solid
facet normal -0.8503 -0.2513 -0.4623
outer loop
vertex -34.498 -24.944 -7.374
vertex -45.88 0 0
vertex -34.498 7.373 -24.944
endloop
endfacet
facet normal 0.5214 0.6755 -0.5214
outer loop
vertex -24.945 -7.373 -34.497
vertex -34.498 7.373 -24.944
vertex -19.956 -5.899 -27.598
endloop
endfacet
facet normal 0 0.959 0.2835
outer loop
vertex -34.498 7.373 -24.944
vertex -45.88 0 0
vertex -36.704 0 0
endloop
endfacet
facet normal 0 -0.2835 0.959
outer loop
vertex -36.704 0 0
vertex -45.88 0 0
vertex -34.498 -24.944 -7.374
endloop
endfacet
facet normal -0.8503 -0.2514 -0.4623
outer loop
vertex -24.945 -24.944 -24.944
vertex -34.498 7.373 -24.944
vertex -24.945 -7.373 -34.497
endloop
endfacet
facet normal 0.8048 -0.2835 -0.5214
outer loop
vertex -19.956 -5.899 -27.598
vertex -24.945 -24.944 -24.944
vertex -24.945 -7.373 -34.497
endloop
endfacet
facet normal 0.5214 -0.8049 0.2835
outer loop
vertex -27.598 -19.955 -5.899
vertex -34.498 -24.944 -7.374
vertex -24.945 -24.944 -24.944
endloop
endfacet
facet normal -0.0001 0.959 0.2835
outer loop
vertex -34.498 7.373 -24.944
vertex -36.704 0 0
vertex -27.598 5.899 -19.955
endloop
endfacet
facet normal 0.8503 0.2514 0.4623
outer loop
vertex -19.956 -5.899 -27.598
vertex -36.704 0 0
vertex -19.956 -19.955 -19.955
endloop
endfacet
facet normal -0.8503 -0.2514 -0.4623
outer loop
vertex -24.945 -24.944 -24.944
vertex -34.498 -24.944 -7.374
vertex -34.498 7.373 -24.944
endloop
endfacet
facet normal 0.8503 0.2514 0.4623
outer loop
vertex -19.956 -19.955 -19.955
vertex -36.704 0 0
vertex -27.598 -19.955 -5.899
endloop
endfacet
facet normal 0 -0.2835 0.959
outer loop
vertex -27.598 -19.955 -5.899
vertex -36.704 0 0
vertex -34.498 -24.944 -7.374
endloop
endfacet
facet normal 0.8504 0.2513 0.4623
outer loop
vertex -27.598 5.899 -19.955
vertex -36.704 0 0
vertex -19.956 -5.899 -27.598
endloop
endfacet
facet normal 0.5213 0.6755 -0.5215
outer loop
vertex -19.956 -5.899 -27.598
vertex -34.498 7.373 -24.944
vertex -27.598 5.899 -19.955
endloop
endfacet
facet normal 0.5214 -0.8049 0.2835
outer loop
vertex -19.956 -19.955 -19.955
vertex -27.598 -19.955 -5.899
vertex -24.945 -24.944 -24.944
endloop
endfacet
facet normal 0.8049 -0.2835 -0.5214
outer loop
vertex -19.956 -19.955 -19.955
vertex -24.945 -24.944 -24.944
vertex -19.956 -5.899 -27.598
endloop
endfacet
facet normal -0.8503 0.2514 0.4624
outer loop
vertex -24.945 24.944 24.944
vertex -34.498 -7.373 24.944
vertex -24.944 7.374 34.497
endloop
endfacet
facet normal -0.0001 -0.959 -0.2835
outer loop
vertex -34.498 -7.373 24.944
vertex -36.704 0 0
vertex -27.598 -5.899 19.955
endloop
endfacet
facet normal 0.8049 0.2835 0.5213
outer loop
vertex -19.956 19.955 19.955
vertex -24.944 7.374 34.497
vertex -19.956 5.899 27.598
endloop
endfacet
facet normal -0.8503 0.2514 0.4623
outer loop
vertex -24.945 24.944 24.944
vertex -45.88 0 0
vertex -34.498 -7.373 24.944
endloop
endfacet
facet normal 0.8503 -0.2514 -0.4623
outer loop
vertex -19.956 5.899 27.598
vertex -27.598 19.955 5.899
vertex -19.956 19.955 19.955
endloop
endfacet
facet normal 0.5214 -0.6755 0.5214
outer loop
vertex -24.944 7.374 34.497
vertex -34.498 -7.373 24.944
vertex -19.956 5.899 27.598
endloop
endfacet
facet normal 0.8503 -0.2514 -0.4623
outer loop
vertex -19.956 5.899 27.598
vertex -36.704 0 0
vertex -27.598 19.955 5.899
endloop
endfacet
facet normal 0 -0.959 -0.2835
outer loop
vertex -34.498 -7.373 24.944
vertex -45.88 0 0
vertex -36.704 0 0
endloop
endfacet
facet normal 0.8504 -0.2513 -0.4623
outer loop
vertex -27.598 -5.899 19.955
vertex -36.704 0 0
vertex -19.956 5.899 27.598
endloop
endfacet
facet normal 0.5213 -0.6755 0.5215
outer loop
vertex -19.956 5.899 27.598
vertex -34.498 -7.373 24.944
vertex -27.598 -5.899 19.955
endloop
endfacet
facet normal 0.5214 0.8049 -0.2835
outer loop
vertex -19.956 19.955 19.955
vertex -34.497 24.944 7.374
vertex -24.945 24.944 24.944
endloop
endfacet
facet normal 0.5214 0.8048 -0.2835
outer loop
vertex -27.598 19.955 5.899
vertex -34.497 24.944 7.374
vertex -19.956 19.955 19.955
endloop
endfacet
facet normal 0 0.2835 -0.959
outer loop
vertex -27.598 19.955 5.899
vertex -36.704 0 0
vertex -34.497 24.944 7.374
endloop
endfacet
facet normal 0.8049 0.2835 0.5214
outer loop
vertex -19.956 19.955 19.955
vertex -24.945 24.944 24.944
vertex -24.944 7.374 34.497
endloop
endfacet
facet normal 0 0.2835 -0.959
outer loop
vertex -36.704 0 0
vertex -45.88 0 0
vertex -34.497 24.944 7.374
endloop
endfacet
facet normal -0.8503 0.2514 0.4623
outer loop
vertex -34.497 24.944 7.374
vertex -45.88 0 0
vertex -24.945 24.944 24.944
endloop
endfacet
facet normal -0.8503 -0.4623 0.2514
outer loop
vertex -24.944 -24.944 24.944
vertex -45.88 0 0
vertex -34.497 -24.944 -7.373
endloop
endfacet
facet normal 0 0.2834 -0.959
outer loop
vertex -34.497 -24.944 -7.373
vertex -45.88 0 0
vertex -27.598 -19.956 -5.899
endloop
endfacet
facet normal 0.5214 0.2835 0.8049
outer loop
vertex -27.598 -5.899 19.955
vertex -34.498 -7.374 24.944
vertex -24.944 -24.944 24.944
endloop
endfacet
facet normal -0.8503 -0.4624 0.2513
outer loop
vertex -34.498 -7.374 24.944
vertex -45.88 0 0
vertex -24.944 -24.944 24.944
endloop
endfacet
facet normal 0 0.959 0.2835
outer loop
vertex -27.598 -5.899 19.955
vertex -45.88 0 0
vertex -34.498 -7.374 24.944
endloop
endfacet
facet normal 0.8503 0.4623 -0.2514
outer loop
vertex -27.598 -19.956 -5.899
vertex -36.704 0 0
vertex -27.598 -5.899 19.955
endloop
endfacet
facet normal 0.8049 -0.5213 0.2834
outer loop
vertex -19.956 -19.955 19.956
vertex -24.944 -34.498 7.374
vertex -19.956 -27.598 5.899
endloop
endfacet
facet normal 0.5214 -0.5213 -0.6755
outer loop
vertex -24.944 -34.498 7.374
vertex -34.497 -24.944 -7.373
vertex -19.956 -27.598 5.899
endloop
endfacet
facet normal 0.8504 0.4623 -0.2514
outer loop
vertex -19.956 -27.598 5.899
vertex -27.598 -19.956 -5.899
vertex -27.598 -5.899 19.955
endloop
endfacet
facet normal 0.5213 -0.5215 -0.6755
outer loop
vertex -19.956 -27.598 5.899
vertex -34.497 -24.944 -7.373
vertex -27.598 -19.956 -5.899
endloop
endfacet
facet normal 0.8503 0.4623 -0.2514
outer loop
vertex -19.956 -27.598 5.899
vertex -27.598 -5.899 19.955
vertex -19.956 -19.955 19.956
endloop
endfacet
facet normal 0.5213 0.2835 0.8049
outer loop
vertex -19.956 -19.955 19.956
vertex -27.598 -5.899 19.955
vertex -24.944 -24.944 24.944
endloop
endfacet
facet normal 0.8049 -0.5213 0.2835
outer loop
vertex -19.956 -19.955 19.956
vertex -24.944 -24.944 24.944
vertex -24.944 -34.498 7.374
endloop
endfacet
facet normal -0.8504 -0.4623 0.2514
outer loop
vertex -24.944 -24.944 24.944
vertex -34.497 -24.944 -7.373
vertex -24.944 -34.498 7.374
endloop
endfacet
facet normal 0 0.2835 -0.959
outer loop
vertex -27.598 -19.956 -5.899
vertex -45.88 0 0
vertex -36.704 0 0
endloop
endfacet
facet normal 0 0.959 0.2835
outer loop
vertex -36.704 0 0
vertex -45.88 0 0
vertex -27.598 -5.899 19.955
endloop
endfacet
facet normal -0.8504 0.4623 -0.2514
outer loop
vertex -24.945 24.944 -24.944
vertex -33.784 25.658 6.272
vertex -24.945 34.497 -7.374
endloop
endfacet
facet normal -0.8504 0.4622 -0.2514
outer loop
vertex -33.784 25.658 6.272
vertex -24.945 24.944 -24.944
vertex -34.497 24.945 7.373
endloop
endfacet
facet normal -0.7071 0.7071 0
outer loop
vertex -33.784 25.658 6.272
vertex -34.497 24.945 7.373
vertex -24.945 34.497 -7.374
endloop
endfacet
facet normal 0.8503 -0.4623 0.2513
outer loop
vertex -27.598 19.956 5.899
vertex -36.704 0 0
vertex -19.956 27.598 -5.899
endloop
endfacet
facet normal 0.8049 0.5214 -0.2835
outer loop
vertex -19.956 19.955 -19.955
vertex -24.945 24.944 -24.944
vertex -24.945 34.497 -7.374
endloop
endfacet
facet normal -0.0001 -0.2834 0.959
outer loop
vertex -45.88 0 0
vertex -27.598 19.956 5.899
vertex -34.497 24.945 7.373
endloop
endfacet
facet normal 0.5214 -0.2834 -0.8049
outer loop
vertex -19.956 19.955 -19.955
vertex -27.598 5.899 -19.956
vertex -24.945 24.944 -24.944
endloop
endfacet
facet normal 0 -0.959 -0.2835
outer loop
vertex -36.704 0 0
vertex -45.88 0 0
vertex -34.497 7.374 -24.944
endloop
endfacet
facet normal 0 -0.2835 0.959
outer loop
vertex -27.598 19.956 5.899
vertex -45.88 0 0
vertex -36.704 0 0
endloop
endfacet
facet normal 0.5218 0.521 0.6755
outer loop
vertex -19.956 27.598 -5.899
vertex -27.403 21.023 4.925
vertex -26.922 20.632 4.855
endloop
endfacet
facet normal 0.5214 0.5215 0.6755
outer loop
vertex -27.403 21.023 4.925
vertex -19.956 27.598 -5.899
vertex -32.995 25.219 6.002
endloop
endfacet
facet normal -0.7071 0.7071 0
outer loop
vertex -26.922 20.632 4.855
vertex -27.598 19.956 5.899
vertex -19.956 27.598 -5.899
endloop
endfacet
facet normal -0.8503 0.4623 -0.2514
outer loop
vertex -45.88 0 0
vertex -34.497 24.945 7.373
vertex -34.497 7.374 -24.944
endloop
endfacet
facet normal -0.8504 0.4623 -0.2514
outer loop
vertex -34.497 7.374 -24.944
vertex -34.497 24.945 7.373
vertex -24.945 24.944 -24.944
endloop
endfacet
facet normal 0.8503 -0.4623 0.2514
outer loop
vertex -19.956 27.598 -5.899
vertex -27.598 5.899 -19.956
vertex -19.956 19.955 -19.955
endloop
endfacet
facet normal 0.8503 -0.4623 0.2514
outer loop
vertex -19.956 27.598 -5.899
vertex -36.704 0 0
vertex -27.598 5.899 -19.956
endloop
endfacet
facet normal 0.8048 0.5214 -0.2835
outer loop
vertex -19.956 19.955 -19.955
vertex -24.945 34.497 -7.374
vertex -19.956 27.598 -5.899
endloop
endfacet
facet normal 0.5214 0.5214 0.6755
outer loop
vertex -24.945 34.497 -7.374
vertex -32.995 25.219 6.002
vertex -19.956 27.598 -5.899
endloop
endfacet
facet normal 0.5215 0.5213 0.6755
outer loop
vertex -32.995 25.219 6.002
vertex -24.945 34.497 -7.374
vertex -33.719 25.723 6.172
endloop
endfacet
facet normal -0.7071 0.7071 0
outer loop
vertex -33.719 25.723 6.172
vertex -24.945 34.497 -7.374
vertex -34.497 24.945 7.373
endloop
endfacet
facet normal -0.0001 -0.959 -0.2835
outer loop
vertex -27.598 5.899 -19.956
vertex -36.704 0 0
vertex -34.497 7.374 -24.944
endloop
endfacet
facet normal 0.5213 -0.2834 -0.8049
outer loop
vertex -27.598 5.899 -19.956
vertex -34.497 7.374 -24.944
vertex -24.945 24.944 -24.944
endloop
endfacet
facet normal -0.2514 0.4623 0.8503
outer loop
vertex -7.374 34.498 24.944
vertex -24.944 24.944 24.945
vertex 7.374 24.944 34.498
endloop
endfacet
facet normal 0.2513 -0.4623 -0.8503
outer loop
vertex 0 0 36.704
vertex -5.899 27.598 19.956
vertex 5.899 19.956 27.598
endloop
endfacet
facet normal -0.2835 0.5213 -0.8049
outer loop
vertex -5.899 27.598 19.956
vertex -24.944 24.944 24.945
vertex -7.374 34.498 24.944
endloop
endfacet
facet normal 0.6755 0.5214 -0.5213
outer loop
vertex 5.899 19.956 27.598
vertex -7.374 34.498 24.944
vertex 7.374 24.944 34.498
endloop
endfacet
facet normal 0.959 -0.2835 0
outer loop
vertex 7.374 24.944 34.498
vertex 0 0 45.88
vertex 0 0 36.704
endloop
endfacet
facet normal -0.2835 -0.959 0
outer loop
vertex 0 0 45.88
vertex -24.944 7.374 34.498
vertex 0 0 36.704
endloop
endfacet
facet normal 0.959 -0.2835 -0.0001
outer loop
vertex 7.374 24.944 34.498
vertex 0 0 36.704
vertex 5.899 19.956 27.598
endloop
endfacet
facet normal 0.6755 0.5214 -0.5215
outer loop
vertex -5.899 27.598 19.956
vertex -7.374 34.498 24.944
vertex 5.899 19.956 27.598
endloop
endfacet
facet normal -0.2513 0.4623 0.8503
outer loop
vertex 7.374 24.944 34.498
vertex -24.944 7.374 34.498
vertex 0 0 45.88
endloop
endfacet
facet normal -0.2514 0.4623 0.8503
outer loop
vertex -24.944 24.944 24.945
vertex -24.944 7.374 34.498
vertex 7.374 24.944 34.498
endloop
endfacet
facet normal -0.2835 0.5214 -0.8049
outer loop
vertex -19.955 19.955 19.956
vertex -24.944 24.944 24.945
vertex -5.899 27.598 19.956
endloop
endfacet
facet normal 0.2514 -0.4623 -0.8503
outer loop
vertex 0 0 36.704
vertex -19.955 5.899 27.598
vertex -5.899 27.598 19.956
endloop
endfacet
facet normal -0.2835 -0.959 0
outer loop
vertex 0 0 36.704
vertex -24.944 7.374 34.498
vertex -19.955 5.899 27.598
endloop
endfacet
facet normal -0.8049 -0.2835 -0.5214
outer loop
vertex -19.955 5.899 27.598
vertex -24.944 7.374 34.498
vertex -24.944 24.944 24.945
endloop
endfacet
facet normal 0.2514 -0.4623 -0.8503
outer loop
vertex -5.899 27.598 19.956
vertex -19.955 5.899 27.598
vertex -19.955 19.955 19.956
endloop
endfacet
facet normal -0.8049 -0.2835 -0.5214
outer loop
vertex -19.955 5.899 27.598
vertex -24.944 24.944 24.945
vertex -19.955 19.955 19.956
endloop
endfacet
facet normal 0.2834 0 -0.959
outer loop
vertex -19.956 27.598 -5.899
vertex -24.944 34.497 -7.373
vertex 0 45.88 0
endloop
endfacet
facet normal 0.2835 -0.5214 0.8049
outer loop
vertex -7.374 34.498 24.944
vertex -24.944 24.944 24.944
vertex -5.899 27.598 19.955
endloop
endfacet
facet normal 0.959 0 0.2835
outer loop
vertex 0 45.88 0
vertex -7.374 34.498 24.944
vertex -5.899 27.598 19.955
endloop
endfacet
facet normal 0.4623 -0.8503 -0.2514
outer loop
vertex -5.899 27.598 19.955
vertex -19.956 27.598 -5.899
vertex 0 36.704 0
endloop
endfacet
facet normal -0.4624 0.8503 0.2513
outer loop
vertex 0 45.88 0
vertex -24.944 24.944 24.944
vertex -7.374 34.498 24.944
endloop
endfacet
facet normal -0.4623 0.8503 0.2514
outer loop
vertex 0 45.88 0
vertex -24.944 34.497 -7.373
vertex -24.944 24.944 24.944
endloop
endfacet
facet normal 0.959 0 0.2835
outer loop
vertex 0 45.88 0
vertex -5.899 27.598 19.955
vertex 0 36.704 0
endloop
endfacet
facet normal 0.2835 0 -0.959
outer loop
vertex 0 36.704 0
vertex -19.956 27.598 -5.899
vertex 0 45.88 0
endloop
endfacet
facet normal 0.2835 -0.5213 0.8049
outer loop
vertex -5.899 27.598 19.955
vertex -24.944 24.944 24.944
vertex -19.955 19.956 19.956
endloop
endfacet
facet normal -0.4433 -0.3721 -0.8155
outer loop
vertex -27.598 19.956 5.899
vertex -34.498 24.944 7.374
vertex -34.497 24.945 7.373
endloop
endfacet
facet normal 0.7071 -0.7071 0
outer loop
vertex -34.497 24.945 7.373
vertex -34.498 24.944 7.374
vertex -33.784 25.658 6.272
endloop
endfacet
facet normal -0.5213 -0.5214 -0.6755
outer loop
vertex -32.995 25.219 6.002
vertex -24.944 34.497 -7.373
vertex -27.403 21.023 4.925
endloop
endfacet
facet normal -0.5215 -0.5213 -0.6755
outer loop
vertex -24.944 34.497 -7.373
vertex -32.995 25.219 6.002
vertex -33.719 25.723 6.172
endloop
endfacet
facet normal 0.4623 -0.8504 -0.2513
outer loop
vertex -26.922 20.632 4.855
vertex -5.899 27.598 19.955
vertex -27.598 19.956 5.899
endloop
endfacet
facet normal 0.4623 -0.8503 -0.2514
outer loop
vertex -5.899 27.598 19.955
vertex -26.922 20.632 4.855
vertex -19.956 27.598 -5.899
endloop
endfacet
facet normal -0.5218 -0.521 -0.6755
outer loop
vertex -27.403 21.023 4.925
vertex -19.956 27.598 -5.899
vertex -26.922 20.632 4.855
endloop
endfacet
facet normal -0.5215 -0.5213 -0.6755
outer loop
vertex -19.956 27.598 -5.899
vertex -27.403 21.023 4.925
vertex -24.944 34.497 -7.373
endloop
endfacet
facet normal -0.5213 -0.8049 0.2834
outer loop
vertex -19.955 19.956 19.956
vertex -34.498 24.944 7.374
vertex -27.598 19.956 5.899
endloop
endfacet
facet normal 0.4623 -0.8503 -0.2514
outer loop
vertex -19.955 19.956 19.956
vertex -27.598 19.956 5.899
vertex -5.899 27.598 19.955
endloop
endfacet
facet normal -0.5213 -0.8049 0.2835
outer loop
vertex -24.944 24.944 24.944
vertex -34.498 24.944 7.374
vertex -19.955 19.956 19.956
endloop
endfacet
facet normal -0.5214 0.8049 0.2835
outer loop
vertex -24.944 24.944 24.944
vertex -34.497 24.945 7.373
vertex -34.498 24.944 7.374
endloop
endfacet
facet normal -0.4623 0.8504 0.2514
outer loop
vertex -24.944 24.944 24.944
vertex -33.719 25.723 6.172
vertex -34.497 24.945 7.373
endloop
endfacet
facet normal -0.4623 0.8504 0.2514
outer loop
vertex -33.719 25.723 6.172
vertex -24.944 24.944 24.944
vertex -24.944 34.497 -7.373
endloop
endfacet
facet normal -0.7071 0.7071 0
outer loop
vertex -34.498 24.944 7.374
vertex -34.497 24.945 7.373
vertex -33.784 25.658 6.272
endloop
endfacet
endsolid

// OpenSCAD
// This is the extrusion amount. 
// When t=1, it extrudes to the center of the polyhedron
t=0.2; 

// Toggle these to determine which faces to draw.
f1 = true;
f2 = true;
f3 = false;
f4 = false;
f5 = false;
f6 = false;
f7 = false;
f8 = false;

scale([20,20,20]){
    if(f1){
    // 1, 2, 3
    color("red"){
        multmatrix([
          [-0.344813, -0.397524, -0.85034],
          [-0.397524, 0.882493, -0.251359],
          [0.85034, 0.251359, -0.462321]
        ])

        translate([0,0,1.95068])
        scale([1,1,-1])
        linear_extrude(height = 1.95068*t, scale=[1-t,1-t], $fn=100)

        polygon([
          [0.777062, -0.507655],
          [0.791002, 0.91192],
          [-0.61236, 0.697535],
          [-0.890117, -0.263117],
          [-0.134704, -0.918365]
        ]);

        multmatrix([
          [0.505527, 0.146165, -0.85034],
          [0.146165, 0.956794, 0.251359],
          [0.85034, -0.251359, 0.462321]
        ])

        translate([0,0,1.95068])
        scale([1,1,-1])
        linear_extrude(height = 1.95068*t, scale=[1-t,1-t], $fn=100)

        polygon([
          [0.890117, -0.263117],
          [0.61236, 0.697535],
          [-0.376172, 0.848548],
          [-1.15968, -0.335303],
          [0.134704, -0.918365]
        ]);

        multmatrix([
          [0.422165, -0.314162, -0.85034],
          [-0.314162, 0.829193, -0.462321],
          [0.85034, 0.462321, 0.251359]
        ])

        translate([0,0,1.95068])
        scale([1,1,-1])
        linear_extrude(height = 1.95068*t, scale=[1-t,1-t], $fn=100)

        polygon([
          [0.328858, -0.867981],
          [0.92586, -0.0657416],
          [0.448204, 0.812805],
          [-0.968448, 0.720689],
          [-0.649854, -0.662744]
        ]);
    };


    }

    if(f2){
    // 4, 12, 18
    color("blue"){
        multmatrix([
          [0.0341457, 0.525124, -0.85034],
          [0.525124, 0.714496, 0.462321],
          [0.85034, -0.462321, -0.251359]
        ])

        translate([0,0,1.95068])
        scale([1,1,-1])
        linear_extrude(height = 1.95068*t, scale=[1-t,1-t], $fn=100)

        polygon([
          [-0.92586, -0.0657416],
          [-0.0783303, -1.20464],
          [0.90955, -0.185087],
          [0.549689, 0.747918],
          [-0.448204, 0.812805]
        ]);

        multmatrix([
          [0.965854, 0.0628037, -0.251359],
          [0.0628037, 0.884486, 0.462321],
          [0.251359, -0.462321, 0.85034]
        ])

        translate([0,0,1.95068])
        scale([1,1,-1])
        linear_extrude(height = 1.95068*t, scale=[1-t,1-t], $fn=100)

        polygon([
          [0.867981, 0.328858],
          [0.0657416, 0.92586],
          [-0.812805, 0.448204],
          [-0.747918, -0.549689],
          [0.576617, -1.06056]
        ]);

        multmatrix([
          [0.829193, 0.314162, -0.462321],
          [0.314162, 0.422165, 0.85034],
          [0.462321, -0.85034, 0.251359]
        ])

        translate([0,0,1.95068])
        scale([1,1,-1])
        linear_extrude(height = 1.95068*t, scale=[1-t,1-t], $fn=100)

        polygon([
          [0.720689, 0.968448],
          [-0.662744, 0.649854],
          [-0.867981, -0.328858],
          [-0.0657416, -0.92586],
          [0.812805, -0.448204]
        ]);   
    }


    }

    if(f3){
    // 5, 13, 21
    color("green"){
        multmatrix([
          [0.505527, 0.146165, 0.85034],
          [0.146165, 0.956794, -0.251359],
          [-0.85034, 0.251359, 0.462321]
        ])

        translate([0,0,1.95068])
        scale([1,1,-1])
        linear_extrude(height = 1.95068*t, scale=[1-t,1-t], $fn=100)

        polygon([
          [1.15968, 0.335303],
          [-0.134704, 0.918365],
          [-0.890117, 0.263117],
          [-0.61236, -0.697535],
          [0.376172, -0.848548]
        ]);

        multmatrix([
          [0.882493, 0.397524, 0.251359],
          [0.397524, -0.344813, -0.85034],
          [-0.251359, 0.85034, -0.462321]
        ])

        translate([0,0,1.95068])
        scale([1,1,-1])
        linear_extrude(height = 1.95068*t, scale=[1-t,1-t], $fn=100)

        polygon([
          [-0.91192, 0.791002],
          [-0.697535, -0.61236],
          [0.263117, -0.890117],
          [0.918365, -0.134704],
          [0.507655, 0.777062]
        ]);

        multmatrix([
          [0.829193, 0.314162, 0.462321],
          [0.314162, 0.422165, -0.85034],
          [-0.462321, 0.85034, 0.251359]
        ])

        translate([0,0,1.95068])
        scale([1,1,-1])
        linear_extrude(height = 1.95068*t, scale=[1-t,1-t], $fn=100)

        polygon([
          [0.867981, 0.328858],
          [0.0657416, 0.92586],
          [-0.812805, 0.448204],
          [-0.720689, -0.968448],
          [0.662744, -0.649854]
        ]);
    };


    }
    if(f4){
    // 6, 7, 22
    color("yellow"){
        multmatrix([
          [-0.344813, -0.397524, 0.85034],
          [-0.397524, 0.882493, 0.251359],
          [-0.85034, -0.251359, -0.462321]
        ])

        translate([0,0,1.95068])
        scale([1,1,-1])
        linear_extrude(height = 1.95068*t, scale=[1-t,1-t], $fn=100)

        polygon([
          [0.61236, -0.697535],
          [0.890117, 0.263117],
          [0.134704, 0.918365],
          [-0.777062, 0.507655],
          [-0.791002, -0.91192]
        ]);

        multmatrix([
          [0.0341457, 0.525124, 0.85034],
          [0.525124, 0.714496, -0.462321],
          [-0.85034, 0.462321, -0.251359]
        ])

        translate([0,0,1.95068])
        scale([1,1,-1])
        linear_extrude(height = 1.95068*t, scale=[1-t,1-t], $fn=100)

        polygon([
          [-0.90955, 0.185087],
          [-0.549689, -0.747918],
          [0.448204, -0.812805],
          [0.92586, 0.0657416],
          [0.0783303, 1.20464]
        ]);

        multmatrix([
          [0.714496, -0.525124, 0.462321],
          [-0.525124, 0.0341457, 0.85034],
          [-0.462321, -0.85034, -0.251359]
        ])

        translate([0,0,1.95068])
        scale([1,1,-1])
        linear_extrude(height = 1.95068*t, scale=[1-t,1-t], $fn=100)

        polygon([
          [0.812805, 0.448204],
          [-0.0657416, 0.92586],
          [-1.20464, 0.0783303],
          [-0.185087, -0.90955],
          [0.747918, -0.549689]
        ]);
    };


    }
    if(f5){
    // 8, 14, 24
    color("orange"){
        multmatrix([
          [0.422165, -0.314162, 0.85034],
          [-0.314162, 0.829193, 0.462321],
          [-0.85034, -0.462321, 0.251359]
        ])

        translate([0,0,1.95068])
        scale([1,1,-1])
        linear_extrude(height = 1.95068*t, scale=[1-t,1-t], $fn=100)

        polygon([
          [0.968448, -0.720689],
          [0.649854, 0.662744],
          [-0.328858, 0.867981],
          [-0.92586, 0.0657416],
          [-0.448204, -0.812805]
        ]);

        multmatrix([
          [0.956794, -0.146165, 0.251359],
          [-0.146165, 0.505527, 0.85034],
          [-0.251359, -0.85034, 0.462321]
        ])

        translate([0,0,1.95068])
        scale([1,1,-1])
        linear_extrude(height = 1.95068*t, scale=[1-t,1-t], $fn=100)

        polygon([
          [0.697535, -0.61236],
          [0.848548, 0.376172],
          [-0.335303, 1.15968],
          [-0.918365, -0.134704],
          [-0.263117, -0.890117]
        ]);

        multmatrix([
          [0.884486, -0.0628037, 0.462321],
          [-0.0628037, 0.965854, 0.251359],
          [-0.462321, -0.251359, 0.85034]
        ])

        translate([0,0,1.95068])
        scale([1,1,-1])
        linear_extrude(height = 1.95068*t, scale=[1-t,1-t], $fn=100)

        polygon([
          [0.92586, -0.0657416],
          [0.448204, 0.812805],
          [-0.549689, 0.747918],
          [-1.06056, -0.576617],
          [0.328858, -0.867981]
        ]);
    };

    }
    if(f6){
    // 9, 15, 19
    color("white"){
        multmatrix([
          [0.956794, -0.146165, -0.251359],
          [-0.146165, 0.505527, -0.85034],
          [0.251359, 0.85034, 0.462321]
        ])

        translate([0,0,1.95068])
        scale([1,1,-1])
        linear_extrude(height = 1.95068*t, scale=[1-t,1-t], $fn=100)

        polygon([
          [0.918365, 0.134704],
          [0.263117, 0.890117],
          [-0.697535, 0.61236],
          [-0.848548, -0.376172],
          [0.335303, -1.15968]
        ]);

        multmatrix([
          [0.965854, 0.0628037, 0.251359],
          [0.0628037, 0.884486, -0.462321],
          [-0.251359, 0.462321, 0.85034]
        ])

        translate([0,0,1.95068])
        scale([1,1,-1])
        linear_extrude(height = 1.95068*t, scale=[1-t,1-t], $fn=100)

        polygon([
          [0.812805, -0.448204],
          [0.747918, 0.549689],
          [-0.576617, 1.06056],
          [-0.867981, -0.328858],
          [-0.0657416, -0.92586]
        ]);

        multmatrix([
          [0.884486, -0.0628037, -0.462321],
          [-0.0628037, 0.965854, -0.251359],
          [0.462321, 0.251359, 0.85034]
        ])

        translate([0,0,1.95068])
        scale([1,1,-1])
        linear_extrude(height = 1.95068*t, scale=[1-t,1-t], $fn=100)

        polygon([
          [1.06056, 0.576617],
          [-0.328858, 0.867981],
          [-0.92586, 0.0657416],
          [-0.448204, -0.812805],
          [0.549689, -0.747918]
        ]);    
    };

    }
    if(f7){
    // 10, 16, 23
    color("cyan"){
        multmatrix([
          [0.882493, 0.397524, -0.251359],
          [0.397524, -0.344813, 0.85034],
          [0.251359, -0.85034, -0.462321]
        ])

        translate([0,0,1.95068])
        scale([1,1,-1])
        linear_extrude(height = 1.95068*t, scale=[1-t,1-t], $fn=100)

        polygon([
          [-0.263117, 0.890117],
          [-0.918365, 0.134704],
          [-0.507655, -0.777062],
          [0.91192, -0.791002],
          [0.697535, 0.61236]
        ]);

        multmatrix([
          [0.577835, -0.776483, 0.251359],
          [-0.776483, -0.428175, 0.462321],
          [-0.251359, -0.462321, -0.85034]
        ])

        translate([0,0,1.95068])
        scale([1,1,-1])
        linear_extrude(height = 1.95068*t, scale=[1-t,1-t], $fn=100)

        polygon([
          [0.576617, 1.06056],
          [-0.747918, 0.549689],
          [-0.812805, -0.448204],
          [0.0657416, -0.92586],
          [0.867981, -0.328858]
        ]);

        multmatrix([
          [-0.428175, 0.776483, 0.462321],
          [0.776483, 0.577835, -0.251359],
          [-0.462321, 0.251359, -0.85034]
        ])

        translate([0,0,1.95068])
        scale([1,1,-1])
        linear_extrude(height = 1.95068*t, scale=[1-t,1-t], $fn=100)

        polygon([
          [-0.92586, -0.0657416],
          [-0.328858, -0.867981],
          [1.06056, -0.576617],
          [0.549689, 0.747918],
          [-0.448204, 0.812805]
        ]);    
    };

    }
    if(f8){
    // 11, 17, 20
    color("magenta"){
        multmatrix([
          [0.577835, -0.776483, -0.251359],
          [-0.776483, -0.428175, -0.462321],
          [0.251359, 0.462321, -0.85034]
        ])

        translate([0,0,1.95068])
        scale([1,1,-1])
        linear_extrude(height = 1.95068*t, scale=[1-t,1-t], $fn=100)

        polygon([
          [0.812805, 0.448204],
          [-0.0657416, 0.92586],
          [-0.867981, 0.328858],
          [-0.576617, -1.06056],
          [0.747918, -0.549689]
        ]);

        multmatrix([
          [0.714496, -0.525124, -0.462321],
          [-0.525124, 0.0341457, -0.85034],
          [0.462321, 0.85034, -0.251359]
        ])

        translate([0,0,1.95068])
        scale([1,1,-1])
        linear_extrude(height = 1.95068*t, scale=[1-t,1-t], $fn=100)

        polygon([
          [0.185087, 0.90955],
          [-0.747918, 0.549689],
          [-0.812805, -0.448204],
          [0.0657416, -0.92586],
          [1.20464, -0.0783303]
        ]);

        multmatrix([
          [-0.428175, 0.776483, -0.462321],
          [0.776483, 0.577835, 0.251359],
          [0.462321, -0.251359, -0.85034]
        ])

        translate([0,0,1.95068])
        scale([1,1,-1])
        linear_extrude(height = 1.95068*t, scale=[1-t,1-t], $fn=100)

        polygon([
          [-0.549689, -0.747918],
          [0.448204, -0.812805],
          [0.92586, 0.0657416],
          [0.328858, 0.867981],
          [-1.06056, 0.576617]
        ]);
    };
    }
}
